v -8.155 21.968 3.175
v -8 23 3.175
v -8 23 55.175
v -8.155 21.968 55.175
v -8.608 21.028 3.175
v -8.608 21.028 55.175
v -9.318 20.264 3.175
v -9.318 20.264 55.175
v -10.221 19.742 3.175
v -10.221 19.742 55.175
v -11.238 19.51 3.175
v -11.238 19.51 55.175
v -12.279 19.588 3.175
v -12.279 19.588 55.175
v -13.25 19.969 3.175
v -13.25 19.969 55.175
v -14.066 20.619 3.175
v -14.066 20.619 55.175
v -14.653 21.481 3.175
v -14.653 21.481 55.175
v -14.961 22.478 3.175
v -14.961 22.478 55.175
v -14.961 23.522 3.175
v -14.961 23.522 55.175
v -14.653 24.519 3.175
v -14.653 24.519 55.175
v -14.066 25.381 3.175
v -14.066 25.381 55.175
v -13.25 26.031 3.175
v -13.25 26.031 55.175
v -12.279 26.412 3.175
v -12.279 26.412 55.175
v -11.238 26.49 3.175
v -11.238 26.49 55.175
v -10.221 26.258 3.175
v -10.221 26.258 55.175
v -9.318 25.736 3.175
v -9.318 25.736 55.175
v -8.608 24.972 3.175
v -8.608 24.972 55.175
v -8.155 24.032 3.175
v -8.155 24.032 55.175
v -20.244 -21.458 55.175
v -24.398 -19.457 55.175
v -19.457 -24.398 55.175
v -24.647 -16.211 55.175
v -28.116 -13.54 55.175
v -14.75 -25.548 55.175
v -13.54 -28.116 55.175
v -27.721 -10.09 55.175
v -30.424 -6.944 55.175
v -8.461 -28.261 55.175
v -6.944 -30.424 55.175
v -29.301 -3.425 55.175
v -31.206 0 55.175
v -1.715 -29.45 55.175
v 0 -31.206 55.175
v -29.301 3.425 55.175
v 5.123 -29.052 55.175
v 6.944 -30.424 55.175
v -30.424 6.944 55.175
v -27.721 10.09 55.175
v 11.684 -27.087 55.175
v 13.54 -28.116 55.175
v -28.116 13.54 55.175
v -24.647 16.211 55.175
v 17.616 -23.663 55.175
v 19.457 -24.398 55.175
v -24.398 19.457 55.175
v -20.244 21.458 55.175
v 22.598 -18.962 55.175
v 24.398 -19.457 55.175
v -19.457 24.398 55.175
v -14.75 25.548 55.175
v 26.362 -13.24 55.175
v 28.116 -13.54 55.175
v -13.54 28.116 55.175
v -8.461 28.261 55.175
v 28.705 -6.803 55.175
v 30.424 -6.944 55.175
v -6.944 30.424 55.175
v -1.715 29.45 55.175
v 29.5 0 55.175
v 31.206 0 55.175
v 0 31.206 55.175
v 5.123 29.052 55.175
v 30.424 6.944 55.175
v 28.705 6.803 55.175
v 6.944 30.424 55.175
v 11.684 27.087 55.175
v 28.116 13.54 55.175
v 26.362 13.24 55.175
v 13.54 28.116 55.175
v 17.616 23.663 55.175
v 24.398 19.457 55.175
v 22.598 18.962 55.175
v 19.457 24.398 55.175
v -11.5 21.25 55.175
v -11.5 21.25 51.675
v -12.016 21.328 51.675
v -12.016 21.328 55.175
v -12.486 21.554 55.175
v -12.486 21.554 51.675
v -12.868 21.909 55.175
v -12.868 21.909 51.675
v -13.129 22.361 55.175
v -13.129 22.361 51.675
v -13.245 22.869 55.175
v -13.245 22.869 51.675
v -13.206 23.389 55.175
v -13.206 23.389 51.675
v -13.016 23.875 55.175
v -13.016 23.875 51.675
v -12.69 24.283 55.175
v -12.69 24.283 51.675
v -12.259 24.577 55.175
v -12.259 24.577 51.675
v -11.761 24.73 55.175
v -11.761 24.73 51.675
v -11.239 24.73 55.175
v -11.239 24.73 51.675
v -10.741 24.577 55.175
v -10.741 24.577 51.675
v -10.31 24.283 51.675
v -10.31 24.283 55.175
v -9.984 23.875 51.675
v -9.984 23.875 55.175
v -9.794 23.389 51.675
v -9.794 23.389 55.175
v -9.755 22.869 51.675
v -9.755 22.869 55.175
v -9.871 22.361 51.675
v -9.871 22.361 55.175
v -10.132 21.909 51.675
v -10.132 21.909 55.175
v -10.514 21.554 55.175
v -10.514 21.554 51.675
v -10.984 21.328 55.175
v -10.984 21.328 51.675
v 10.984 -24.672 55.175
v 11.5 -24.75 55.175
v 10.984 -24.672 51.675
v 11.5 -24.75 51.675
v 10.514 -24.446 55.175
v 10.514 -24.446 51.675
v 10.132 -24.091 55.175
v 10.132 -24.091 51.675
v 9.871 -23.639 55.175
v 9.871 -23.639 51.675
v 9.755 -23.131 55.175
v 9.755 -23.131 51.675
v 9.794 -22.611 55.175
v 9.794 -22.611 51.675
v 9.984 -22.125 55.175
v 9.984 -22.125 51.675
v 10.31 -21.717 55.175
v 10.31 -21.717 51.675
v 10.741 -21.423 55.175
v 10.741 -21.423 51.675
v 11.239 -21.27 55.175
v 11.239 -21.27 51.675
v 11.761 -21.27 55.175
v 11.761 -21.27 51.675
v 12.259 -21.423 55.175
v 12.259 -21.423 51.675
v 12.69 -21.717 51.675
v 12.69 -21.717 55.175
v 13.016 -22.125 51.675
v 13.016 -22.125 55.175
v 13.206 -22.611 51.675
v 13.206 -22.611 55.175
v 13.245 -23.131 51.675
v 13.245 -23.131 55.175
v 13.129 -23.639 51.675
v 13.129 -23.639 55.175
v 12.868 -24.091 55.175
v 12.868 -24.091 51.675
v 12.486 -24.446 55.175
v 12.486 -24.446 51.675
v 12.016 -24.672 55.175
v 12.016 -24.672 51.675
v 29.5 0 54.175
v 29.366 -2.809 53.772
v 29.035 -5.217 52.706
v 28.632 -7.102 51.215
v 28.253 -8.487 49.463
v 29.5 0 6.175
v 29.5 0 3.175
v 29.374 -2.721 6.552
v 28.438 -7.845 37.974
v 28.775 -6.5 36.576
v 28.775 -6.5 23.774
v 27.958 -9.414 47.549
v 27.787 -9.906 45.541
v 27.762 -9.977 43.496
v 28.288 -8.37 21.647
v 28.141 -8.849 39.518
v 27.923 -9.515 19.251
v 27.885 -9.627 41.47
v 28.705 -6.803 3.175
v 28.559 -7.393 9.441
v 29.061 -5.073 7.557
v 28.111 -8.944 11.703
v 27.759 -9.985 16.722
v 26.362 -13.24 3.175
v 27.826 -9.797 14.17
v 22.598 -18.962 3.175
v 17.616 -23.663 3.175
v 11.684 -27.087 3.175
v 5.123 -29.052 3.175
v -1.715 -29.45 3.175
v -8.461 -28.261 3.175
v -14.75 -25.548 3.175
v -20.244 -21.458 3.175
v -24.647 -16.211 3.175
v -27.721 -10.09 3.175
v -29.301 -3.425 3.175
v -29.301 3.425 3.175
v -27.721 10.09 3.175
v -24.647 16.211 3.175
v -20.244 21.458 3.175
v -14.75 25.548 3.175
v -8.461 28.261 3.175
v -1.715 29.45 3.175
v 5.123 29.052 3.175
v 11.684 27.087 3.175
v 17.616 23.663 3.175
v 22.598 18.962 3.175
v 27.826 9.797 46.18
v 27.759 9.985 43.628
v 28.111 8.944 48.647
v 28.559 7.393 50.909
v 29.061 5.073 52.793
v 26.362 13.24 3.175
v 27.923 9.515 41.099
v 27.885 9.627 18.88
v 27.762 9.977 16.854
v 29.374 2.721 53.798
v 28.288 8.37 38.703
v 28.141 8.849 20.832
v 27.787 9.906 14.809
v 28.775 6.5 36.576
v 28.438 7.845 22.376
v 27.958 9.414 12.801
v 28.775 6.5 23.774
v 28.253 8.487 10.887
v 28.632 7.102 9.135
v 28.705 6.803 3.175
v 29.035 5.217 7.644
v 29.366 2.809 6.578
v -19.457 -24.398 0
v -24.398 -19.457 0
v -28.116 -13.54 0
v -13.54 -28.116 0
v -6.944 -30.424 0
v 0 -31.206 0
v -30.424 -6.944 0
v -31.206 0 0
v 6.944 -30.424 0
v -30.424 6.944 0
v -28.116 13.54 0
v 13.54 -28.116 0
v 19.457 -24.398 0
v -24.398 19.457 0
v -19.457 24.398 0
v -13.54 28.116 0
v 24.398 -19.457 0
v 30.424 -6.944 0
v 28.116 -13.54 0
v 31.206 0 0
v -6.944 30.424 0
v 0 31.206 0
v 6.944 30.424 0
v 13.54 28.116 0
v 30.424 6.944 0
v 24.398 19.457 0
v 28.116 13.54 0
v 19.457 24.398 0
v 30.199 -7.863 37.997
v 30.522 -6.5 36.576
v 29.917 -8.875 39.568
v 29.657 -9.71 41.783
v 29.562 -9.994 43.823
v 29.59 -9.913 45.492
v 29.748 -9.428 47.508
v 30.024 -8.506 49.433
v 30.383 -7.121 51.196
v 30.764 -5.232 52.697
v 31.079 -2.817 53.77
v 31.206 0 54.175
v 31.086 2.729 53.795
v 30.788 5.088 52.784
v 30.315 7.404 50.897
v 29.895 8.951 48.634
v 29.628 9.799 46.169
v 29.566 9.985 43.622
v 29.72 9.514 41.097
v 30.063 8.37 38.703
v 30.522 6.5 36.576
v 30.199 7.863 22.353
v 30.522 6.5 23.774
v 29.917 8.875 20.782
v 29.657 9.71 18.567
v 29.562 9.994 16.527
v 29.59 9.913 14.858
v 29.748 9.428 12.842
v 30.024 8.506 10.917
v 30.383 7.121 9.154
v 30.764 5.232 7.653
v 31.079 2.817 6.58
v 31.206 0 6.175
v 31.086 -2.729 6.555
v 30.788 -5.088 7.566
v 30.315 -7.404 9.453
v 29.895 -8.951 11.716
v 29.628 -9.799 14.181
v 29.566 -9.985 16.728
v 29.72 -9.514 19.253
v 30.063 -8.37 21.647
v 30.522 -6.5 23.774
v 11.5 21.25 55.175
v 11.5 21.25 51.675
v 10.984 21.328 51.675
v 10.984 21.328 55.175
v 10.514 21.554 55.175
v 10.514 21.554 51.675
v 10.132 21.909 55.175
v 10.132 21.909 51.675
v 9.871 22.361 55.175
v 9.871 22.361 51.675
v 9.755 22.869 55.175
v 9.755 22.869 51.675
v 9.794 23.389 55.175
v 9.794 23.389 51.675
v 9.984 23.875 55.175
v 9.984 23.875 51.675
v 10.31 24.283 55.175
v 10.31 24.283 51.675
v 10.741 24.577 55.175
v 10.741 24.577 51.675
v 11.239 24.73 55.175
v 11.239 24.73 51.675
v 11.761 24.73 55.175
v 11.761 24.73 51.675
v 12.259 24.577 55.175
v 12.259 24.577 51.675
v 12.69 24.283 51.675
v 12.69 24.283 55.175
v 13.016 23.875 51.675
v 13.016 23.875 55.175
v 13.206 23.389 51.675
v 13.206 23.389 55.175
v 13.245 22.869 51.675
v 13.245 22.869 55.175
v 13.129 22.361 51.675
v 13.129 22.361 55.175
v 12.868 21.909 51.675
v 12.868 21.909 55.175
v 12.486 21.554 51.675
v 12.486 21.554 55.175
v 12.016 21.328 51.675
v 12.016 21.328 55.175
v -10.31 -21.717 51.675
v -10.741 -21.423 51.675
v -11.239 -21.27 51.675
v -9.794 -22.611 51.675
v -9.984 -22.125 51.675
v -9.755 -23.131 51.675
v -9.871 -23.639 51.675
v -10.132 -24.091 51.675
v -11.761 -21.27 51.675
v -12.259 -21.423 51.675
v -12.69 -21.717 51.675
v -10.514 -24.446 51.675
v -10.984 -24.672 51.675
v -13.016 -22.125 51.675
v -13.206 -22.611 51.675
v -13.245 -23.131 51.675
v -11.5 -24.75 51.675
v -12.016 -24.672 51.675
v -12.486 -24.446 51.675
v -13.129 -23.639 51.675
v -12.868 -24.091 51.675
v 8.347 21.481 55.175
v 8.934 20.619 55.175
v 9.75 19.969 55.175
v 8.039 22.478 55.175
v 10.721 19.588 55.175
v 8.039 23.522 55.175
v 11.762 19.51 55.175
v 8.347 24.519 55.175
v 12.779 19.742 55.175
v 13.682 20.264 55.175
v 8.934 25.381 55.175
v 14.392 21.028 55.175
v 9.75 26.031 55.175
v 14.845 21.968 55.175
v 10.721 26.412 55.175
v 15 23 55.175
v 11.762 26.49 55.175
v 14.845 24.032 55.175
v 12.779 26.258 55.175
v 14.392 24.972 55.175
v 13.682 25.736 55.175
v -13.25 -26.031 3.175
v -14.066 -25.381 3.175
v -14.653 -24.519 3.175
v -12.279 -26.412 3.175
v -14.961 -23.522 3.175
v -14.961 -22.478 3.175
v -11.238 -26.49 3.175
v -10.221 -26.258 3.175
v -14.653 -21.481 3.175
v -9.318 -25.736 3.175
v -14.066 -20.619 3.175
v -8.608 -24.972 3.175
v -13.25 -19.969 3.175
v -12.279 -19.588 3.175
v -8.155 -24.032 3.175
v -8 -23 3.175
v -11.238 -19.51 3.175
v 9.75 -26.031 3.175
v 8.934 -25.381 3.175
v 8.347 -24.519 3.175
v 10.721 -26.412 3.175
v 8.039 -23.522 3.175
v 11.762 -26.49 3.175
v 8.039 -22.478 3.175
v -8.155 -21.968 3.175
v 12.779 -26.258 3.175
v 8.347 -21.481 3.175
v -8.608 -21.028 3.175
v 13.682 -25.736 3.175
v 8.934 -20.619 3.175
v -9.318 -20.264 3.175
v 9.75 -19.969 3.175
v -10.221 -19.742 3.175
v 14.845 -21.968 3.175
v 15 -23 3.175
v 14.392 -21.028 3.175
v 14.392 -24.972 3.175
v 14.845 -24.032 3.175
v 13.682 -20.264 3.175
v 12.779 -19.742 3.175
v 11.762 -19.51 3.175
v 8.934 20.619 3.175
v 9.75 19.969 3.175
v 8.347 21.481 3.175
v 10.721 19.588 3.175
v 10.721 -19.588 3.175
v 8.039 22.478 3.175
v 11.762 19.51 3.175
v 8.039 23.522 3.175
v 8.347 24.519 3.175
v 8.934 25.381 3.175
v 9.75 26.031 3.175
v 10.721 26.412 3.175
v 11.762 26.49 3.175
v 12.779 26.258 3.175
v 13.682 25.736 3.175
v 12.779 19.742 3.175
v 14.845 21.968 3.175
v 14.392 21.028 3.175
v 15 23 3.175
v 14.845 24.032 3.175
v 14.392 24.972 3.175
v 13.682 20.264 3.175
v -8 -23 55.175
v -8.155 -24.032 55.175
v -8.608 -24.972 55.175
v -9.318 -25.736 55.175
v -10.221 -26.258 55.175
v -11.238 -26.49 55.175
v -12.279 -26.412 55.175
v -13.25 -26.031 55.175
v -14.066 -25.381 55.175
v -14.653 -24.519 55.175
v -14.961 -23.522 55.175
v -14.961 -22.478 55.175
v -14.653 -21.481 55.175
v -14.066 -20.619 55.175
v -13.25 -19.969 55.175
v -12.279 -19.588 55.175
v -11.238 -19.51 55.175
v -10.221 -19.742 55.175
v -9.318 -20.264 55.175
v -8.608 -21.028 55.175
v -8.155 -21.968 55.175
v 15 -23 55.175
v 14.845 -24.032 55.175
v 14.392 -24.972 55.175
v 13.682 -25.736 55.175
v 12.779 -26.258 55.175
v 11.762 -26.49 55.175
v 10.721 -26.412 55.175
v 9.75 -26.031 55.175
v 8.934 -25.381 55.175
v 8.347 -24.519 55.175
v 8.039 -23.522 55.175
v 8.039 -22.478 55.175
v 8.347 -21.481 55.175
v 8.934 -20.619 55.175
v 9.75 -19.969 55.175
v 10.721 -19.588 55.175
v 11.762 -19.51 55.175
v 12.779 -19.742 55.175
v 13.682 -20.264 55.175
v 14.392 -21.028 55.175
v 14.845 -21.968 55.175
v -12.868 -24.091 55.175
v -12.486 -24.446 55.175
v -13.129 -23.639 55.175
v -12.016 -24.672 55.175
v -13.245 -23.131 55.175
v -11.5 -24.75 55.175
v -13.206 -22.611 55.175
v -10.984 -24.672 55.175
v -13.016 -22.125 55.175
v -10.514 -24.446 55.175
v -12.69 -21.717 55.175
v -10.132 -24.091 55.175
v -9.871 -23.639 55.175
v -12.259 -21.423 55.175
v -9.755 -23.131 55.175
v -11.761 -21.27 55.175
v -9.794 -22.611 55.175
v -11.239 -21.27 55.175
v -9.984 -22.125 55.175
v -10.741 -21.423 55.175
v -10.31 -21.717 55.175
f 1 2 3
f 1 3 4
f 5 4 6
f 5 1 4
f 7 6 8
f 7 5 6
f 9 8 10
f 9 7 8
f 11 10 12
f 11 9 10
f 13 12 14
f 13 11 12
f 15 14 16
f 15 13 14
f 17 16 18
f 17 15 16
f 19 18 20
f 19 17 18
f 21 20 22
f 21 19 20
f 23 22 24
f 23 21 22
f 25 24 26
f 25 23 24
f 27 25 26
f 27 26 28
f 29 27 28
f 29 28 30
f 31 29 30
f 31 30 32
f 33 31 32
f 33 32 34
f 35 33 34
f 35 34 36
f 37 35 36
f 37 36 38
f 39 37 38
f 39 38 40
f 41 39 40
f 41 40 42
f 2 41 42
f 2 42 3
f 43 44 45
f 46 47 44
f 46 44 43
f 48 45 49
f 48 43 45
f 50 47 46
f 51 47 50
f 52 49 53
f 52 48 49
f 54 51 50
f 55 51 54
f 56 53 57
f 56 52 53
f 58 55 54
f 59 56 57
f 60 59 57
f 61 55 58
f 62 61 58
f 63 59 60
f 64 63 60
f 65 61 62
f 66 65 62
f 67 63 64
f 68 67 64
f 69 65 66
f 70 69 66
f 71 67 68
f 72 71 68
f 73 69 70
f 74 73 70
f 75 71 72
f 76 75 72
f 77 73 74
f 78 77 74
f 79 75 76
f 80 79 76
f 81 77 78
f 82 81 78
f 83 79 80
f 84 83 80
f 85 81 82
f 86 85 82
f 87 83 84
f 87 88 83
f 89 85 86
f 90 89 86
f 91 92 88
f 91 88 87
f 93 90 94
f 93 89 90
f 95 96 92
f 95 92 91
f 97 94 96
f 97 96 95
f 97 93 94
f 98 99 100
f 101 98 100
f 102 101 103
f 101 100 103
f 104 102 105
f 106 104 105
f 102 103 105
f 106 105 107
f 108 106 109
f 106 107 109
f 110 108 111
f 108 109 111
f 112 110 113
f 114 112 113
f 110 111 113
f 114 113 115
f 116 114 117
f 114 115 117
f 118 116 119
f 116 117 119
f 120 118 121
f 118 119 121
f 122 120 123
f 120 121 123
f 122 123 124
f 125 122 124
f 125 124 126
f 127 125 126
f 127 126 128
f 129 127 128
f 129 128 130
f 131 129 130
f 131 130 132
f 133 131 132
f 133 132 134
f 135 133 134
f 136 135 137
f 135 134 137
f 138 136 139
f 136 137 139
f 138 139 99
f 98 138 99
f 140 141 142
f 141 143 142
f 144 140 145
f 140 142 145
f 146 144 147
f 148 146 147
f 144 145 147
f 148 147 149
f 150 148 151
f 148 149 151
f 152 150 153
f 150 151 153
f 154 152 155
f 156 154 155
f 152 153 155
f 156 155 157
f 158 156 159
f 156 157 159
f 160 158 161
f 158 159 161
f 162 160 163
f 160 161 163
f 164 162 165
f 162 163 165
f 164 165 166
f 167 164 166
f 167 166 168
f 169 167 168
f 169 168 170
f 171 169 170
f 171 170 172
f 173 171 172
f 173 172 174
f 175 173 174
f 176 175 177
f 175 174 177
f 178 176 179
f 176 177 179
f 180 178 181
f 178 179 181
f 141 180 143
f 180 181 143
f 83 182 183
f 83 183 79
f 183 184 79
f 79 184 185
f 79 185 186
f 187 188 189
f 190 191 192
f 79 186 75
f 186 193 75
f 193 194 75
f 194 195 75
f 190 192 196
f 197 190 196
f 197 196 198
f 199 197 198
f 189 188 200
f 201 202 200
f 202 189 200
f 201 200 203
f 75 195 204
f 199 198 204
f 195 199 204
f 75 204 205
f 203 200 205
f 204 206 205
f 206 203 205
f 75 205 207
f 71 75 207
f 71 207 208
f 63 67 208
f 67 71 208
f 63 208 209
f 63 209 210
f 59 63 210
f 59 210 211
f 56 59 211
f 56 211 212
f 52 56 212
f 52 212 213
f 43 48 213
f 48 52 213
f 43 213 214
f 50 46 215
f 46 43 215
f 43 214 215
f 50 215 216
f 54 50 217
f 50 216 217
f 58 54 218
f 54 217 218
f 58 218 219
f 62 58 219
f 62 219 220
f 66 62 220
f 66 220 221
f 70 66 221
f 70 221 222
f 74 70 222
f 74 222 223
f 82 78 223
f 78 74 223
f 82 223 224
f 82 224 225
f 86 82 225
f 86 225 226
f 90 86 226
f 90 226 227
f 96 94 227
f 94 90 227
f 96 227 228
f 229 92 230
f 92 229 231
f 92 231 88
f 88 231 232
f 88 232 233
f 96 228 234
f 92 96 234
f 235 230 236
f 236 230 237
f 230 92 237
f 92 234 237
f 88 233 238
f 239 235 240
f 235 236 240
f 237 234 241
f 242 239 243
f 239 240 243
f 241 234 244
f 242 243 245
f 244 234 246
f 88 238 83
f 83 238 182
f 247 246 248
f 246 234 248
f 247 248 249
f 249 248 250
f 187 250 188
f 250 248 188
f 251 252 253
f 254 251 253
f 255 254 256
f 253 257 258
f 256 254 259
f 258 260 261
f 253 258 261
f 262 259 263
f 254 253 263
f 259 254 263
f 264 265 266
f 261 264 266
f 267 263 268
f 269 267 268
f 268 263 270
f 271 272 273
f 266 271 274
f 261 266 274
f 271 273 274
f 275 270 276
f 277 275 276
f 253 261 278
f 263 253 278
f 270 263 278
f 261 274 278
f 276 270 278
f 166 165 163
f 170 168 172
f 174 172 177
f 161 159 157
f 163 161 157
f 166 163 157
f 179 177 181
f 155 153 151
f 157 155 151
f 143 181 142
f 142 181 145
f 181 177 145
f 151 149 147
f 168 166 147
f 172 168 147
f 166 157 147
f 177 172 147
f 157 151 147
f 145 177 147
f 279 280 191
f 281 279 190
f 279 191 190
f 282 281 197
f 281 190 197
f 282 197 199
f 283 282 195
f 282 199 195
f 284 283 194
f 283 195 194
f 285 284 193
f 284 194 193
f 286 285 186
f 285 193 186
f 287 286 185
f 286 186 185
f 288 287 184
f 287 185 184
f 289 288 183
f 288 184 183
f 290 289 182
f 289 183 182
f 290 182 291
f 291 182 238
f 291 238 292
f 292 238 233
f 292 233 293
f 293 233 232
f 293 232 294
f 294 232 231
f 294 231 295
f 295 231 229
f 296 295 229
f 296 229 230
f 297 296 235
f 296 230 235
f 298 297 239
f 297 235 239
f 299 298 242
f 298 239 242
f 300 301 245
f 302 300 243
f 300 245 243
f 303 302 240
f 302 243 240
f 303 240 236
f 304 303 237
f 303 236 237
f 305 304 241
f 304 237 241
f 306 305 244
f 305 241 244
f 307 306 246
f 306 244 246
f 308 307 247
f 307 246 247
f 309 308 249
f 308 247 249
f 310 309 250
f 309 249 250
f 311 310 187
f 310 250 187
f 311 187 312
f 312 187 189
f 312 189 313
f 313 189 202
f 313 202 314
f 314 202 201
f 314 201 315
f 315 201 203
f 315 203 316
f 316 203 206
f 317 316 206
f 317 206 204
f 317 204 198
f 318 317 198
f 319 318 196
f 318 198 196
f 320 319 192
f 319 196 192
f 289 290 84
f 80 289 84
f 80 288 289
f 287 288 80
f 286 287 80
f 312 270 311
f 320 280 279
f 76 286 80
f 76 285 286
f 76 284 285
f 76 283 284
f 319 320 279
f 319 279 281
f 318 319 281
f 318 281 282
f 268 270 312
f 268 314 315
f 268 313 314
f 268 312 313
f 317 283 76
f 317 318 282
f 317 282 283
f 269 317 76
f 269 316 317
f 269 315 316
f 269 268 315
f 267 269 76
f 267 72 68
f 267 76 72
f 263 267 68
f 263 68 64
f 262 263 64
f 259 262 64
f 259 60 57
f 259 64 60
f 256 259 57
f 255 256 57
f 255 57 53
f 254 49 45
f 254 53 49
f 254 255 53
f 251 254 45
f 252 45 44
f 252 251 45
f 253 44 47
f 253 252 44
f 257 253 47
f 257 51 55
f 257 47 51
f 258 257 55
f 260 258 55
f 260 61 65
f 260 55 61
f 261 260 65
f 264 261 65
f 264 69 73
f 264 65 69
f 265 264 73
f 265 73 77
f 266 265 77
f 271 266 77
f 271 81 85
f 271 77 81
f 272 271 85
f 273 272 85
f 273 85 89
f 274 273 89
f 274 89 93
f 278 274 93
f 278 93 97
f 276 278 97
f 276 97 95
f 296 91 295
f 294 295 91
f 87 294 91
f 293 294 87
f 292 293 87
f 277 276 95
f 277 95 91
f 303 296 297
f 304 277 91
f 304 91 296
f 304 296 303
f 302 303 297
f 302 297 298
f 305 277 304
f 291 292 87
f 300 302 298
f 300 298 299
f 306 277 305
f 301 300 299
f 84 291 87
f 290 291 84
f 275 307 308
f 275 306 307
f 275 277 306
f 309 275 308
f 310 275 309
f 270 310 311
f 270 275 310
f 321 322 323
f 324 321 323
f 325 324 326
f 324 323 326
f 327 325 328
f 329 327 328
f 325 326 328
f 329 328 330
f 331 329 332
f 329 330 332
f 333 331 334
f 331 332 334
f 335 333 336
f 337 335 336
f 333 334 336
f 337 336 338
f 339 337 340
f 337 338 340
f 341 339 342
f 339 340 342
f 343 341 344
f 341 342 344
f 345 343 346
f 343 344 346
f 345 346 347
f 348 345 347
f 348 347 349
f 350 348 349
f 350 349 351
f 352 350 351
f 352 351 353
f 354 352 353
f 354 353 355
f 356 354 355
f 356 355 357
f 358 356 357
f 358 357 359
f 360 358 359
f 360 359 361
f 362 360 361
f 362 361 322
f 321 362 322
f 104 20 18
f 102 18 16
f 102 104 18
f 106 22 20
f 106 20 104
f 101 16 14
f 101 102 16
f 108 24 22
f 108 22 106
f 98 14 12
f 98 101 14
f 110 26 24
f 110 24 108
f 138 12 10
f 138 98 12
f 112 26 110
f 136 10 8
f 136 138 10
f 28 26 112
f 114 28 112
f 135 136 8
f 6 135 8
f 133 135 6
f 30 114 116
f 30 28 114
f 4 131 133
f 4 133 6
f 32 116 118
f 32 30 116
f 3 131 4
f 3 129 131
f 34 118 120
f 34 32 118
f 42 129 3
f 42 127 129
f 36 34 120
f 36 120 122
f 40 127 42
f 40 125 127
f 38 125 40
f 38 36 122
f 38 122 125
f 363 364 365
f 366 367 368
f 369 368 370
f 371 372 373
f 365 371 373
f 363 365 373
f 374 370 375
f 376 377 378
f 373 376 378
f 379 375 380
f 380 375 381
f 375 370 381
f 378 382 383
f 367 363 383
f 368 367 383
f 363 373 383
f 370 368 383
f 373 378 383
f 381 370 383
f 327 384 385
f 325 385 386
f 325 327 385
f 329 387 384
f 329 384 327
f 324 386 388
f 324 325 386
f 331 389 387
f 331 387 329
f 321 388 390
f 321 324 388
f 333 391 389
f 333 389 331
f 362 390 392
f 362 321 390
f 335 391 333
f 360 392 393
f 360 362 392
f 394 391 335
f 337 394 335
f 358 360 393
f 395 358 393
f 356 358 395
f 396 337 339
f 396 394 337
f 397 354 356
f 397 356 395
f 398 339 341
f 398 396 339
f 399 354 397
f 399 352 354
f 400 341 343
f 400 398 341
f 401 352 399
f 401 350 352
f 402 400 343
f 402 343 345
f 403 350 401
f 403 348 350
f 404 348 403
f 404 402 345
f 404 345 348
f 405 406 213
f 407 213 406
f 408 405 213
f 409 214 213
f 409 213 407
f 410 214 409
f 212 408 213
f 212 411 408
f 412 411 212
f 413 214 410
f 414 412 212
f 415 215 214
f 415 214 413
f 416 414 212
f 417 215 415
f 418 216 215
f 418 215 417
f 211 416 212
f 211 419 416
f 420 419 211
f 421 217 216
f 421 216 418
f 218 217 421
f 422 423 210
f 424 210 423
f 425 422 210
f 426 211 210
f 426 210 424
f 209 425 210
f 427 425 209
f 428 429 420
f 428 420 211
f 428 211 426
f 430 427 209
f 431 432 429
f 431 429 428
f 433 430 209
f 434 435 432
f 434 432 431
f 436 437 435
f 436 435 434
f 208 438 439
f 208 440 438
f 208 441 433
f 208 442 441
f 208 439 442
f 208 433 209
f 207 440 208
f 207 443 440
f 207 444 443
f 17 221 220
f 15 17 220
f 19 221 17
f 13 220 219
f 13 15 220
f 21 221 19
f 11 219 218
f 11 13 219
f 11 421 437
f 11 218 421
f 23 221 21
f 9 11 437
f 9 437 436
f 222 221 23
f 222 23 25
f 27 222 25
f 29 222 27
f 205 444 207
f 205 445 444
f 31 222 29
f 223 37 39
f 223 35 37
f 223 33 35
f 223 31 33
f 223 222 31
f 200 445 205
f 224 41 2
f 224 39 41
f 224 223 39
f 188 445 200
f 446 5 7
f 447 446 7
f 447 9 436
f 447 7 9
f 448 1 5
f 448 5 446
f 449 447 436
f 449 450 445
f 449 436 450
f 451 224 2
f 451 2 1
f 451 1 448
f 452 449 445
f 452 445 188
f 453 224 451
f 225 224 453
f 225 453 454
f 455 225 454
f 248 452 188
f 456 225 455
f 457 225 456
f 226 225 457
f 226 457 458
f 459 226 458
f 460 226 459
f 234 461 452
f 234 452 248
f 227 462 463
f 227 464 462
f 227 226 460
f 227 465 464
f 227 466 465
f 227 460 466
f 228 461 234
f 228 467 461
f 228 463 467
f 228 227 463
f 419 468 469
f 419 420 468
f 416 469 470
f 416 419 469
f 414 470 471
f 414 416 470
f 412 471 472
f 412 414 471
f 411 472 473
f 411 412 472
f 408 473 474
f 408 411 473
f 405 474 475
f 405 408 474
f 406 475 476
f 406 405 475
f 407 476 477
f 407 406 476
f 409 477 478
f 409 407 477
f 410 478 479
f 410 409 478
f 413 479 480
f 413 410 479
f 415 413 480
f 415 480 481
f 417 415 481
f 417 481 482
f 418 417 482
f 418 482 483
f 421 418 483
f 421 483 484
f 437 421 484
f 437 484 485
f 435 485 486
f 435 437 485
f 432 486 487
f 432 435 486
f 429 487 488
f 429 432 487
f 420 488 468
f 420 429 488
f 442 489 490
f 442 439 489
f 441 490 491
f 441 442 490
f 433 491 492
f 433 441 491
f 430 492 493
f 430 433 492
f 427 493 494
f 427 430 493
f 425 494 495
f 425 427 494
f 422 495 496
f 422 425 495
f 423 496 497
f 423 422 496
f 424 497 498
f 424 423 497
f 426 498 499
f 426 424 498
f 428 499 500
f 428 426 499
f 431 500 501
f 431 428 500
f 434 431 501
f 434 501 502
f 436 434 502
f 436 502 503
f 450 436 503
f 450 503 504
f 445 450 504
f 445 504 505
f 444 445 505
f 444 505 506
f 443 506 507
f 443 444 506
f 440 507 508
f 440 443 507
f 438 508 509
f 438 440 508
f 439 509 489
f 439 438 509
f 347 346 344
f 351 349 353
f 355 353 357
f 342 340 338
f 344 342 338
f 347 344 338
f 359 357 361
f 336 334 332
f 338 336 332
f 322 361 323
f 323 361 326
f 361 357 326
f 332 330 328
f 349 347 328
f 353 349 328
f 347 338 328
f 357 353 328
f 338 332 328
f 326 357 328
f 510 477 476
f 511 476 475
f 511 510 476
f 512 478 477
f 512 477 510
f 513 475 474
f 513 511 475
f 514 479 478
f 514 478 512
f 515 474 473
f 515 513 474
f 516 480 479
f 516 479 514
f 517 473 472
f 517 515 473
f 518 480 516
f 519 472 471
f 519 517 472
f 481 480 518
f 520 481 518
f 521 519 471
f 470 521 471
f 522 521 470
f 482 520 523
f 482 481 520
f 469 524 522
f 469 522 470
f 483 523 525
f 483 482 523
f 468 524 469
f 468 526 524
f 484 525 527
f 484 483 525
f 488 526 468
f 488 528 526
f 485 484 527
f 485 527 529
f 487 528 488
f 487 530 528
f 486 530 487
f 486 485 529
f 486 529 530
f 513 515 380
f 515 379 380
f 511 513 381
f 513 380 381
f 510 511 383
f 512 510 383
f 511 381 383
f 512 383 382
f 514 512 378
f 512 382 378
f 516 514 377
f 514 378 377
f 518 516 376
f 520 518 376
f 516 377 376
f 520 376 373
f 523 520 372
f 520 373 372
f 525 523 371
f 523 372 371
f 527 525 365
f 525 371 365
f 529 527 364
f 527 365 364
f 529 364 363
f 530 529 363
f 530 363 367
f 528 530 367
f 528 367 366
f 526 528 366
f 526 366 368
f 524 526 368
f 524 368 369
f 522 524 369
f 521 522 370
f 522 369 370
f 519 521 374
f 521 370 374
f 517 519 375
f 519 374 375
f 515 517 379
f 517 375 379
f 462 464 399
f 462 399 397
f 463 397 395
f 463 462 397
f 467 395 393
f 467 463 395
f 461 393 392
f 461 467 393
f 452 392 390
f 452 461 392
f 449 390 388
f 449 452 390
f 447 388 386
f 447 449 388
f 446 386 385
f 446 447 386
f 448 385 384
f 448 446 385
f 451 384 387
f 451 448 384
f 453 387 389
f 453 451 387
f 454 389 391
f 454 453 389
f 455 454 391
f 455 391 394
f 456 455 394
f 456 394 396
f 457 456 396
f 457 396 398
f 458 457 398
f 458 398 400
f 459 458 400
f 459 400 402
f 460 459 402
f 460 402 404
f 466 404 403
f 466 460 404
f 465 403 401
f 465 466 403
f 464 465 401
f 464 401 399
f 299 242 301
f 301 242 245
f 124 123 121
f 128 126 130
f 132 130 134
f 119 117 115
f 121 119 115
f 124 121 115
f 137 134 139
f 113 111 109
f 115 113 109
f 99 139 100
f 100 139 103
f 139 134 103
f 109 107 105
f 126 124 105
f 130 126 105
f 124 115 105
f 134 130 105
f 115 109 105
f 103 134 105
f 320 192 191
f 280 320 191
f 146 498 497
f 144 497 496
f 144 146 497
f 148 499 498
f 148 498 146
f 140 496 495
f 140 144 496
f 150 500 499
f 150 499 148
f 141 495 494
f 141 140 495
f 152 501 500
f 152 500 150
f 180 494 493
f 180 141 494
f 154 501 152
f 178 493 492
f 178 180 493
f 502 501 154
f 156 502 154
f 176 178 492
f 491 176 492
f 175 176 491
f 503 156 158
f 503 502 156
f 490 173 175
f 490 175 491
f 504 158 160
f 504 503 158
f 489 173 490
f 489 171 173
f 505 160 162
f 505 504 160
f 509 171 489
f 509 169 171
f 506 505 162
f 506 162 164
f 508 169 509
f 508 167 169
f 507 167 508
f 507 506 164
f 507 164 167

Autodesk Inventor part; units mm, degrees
ref_plane "YZ Plane" through (0, 0, 0) normal (1, 0, 0) x (0, 1, 0)
ref_plane "XZ Plane" through (0, 0, 0) normal (0, 1, 0) x (-1, 0, 0)
ref_plane "XY Plane" through (0, 0, 0) normal (0, 0, 1) x (1, 0, 0)
sketch "Sketch1" plane through (0, 0, 0) normal (0, 0, 1) x (1, 0, 0)
  circle A0 centre (0, 0) radius 31.206
  dimension "d0" = 62.412
extrude "Extrusion1" add sketch "Sketch1" along normal blind 3.175
sketch "Sketch2" plane through (0, 0, 3.175) normal (0, 0, 1) x (1, 0, 0)
  circle A0 centre (0, 0) radius 31.206
  circle A1 centre (0, 0) radius 29.5
  dimension "d3" = 59
sketch "Sketch3" plane through (0, 0, 3.175) normal (0, 0, 1) x (1, 0, 0)
  line L0 (0, 0) -> (-20, 0)
  line L1 (-20, 0) -> (-20, 18)
  line L2 (-20, 18) -> (-23.175, 18)
  line L3 (-23.175, 18) -> (-23.175, -18)
  line L4 (-23.175, -18) -> (-20, -18)
  line L5 (-20, -18) -> (-20, 18)
  dimension "d4" = 20
  dimension "d5" = 18
  dimension "d6" = 3.175
  dimension "d7" = 36
extrude "Extrusion2" add sketch "Sketch3" along normal blind 52
sketch "Sketch4" plane through (-20, -18, 3.175) normal (1, 0, 0) x (0, 0, -1)
  line L0 (0, 49.206) -> (0, -13.206) projected
  line L1 (-52, 36) -> (-52, 0) projected
  line L2 (-27, 18) -> (-3, 18)
  line L3 (-3, 18) -> (-51, 18)
  line L4 (-27, 18) -> (-41, 18)
  line L5 (-41, 18) -> (-13, 18)
  circle A0 centre (-41, 18) radius 10
  circle A1 centre (-13, 18) radius 10
  line L6 (-13, 18) -> (-41, 18)
  line L7 (-41, 18) -> (-41, 24.5)
  line L8 (-41, 24.5) -> (-13, 24.5)
  line L9 (-13, 24.5) -> (-13, 18)
  line L10 (-41, 24.5) -> (-13, 24.5)
  line L11 (-13, 24.5) -> (-13, 11.5)
  line L12 (-13, 11.5) -> (-41, 11.5)
  line L13 (-41, 11.5) -> (-41, 24.5)
  point P0 (3.175, 18)
  dimension "d34" = 24
  dimension "d35" = 48
  dimension "d36" = 14
  dimension "d37" = 28
  dimension "d38" = 20
  dimension "d39" = 20
  dimension "d40" = 6.5
  dimension "d41" = 13
extrude "Extrusion3" add sketch "Sketch2" along normal blind 52
sketch "Sketch5" plane through (0, 0, 3.175) normal (0, 0, 1) x (1, 0, 0)
  line L0 (0, 0) -> (0, 23)
  line L1 (0, 23) -> (11.5, 23)
  line L2 (11.5, 23) -> (-11.5, 23)
  line L3 (-11.5, 23) -> (-11.5, -23)
  line L4 (-11.5, -23) -> (11.5, -23)
  line L5 (11.5, -23) -> (11.5, 23)
  circle A0 centre (-11.5, 23) radius 3.5
  circle A1 centre (11.5, 23) radius 3.5
  circle A2 centre (-11.5, -23) radius 3.5
  circle A3 centre (11.5, -23) radius 3.5
  dimension "d16" = 23
  dimension "d17" = 11.5
  dimension "d18" = 23
  dimension "d19" = 46
  dimension "d20" = 7
  dimension "d21" = 7
  dimension "d22" = 7
  dimension "d23" = 7
extrude "Extrusion4" add sketch "Sketch5" along normal blind 52 contours A1 L5 L1 | L1 L5 A1 | A0 L3 L2 | L2 L3 A0 | A3 L4 L5 | L5 L4 A3 | A2 L4 L3 | L3 L4 A2
sketch "Sketch6" plane through (-11.5, 23, 55.175) normal (0, 0, 1) x (1, 0, 0)
  circle A0 centre (0, 0) radius 3.5 projected
  circle A1 centre (23, 0) radius 3.5 projected
  circle A2 centre (23, -46) radius 3.5 projected
  circle A3 centre (0, -46) radius 3.5 projected
  point P0 (11.5, -23)
hole "Hole1" at (-11.5, 23, 55.175) at (11.5, 23, 55.175) at (11.5, -23, 55.175) at (-11.5, -23, 55.175) direction (0, 0, -1) diameter 3.5 depth 3.5
extrude "Extrusion5" cut sketch "Sketch4" along normal blind 52
sketch "Sketch7" plane through (0, 0, 55.175) normal (0, 0, 1) x (1, 0, 0)
  line L0 (-20, 18) -> (-23.175, 18) projected
  line L1 (-23.175, 18) -> (-23.175, -18) projected
  line L2 (-20, 18) -> (-23.175, 18)
  line L3 (-23.175, 18) -> (-23.175, -18)
  line L4 (-23.175, -18) -> (-20, -18)
  line L5 (-20, -18) -> (-20, 18)
  point P0 (0, 0)
extrude "Extrusion6" cut sketch "Sketch7" against normal blind 52
properties part number "LidarLiteV3Lid"
